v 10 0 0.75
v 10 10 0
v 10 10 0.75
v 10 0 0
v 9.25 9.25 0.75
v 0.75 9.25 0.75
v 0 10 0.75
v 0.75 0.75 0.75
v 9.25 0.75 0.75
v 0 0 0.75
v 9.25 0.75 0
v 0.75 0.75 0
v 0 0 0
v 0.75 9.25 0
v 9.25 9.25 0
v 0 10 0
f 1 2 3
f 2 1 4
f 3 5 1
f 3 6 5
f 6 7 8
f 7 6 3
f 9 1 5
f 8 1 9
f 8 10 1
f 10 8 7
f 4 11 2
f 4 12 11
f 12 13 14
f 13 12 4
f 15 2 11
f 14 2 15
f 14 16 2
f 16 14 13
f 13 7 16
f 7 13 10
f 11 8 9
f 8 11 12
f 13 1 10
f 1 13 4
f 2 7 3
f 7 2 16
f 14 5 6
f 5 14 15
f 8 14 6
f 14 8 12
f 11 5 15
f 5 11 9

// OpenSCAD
$w = .75;
$id = [0,0,0];

module leg_segment(start,vector,l1,l2){
translate(start){
    //bottom
    horizontal_plane(l1);

/*(1)
    //top
    translate(vector){
        horizontal_plane(l2);
    }
    
    $0 = $id;
    $1 = $id+[l1-$w,0,0];
    $2 = $id+[l1-$w,l1-$w,0];
    $3 = $id+[0,l1-$w,0];
    
    $4 = vector;
    $5 = vector+[l2-$w,0,0];
    $6 = vector+[l2-$w,l2-$w,0];
    $7 = vector+[0,l2-$w,0];
    
/*(2)
    
    //vertical columns
    diagonal_bar($0,$4);
    diagonal_bar($1,$5);
    diagonal_bar($3,$7);
    diagonal_bar($2,$6);

/*(3)
   
    //cross columns
    diagonal_bar($0,$5);
    diagonal_bar($1,$4);
    
    diagonal_bar($3,$4);
    diagonal_bar($0,$7);
    
    diagonal_bar($1,$6);
    diagonal_bar($2,$5);
    
    diagonal_bar($3,$6);
    diagonal_bar($2,$7);

*/

}   
}

module horizontal_plane(length){
    cube([length,$w,$w]);
    translate([0,length-$w,0]) cube([length,$w,$w]);
    translate([$w,0,0]) rotate([0,0,90]) cube([length,$w,$w]);
    translate([length,0,0]) rotate([0,0,90]) cube([length,$w,$w]);
}

module diagonal_bar(start,end){
    hull(){
        translate(start) cube([$w,$w,$w]);
        translate(end) cube([$w,$w,$w]);
    }
}

module leg(n,start,vector,ldelta,scale){
    if (ldelta<1){
        for(x=[0 : n-1]){
            $start = start + 
                [vector[0]*((1 - pow(ldelta,x))/(1 - ldelta)),
                vector[1]*((1 - pow(ldelta,x))/(1 - ldelta)),
                vector[2]*x];
            $vec = [vector[0] * pow(ldelta,x), vector[1] * pow(ldelta,x), vector[2]];
            leg_segment($start, 
                $vec,
                scale - .5*vector[0]*((1 - pow(ldelta,x))/(1 - ldelta)),
                scale - .5*vector[1]*((1 - pow(ldelta,x+1))/(1 - ldelta)));
    //        leg_segment(start+(x*vector), vector, scale - x, scale - x - 1);
        }
    } else {
        for(x=[1 : n]){
            leg_segment(start+(vector*(x-1)),vector,scale,scale);
        }
    }
}


//(4a) for(r=[0,1,2,3]){ rotate([0,0,r*90]) translate([-20,-20,0]){
    leg_segment([0,0,0],[2,3,6],10,10);
//(5*)    leg(3,[0,0,0],[2,2,6],1,10);
//(4b) }}
